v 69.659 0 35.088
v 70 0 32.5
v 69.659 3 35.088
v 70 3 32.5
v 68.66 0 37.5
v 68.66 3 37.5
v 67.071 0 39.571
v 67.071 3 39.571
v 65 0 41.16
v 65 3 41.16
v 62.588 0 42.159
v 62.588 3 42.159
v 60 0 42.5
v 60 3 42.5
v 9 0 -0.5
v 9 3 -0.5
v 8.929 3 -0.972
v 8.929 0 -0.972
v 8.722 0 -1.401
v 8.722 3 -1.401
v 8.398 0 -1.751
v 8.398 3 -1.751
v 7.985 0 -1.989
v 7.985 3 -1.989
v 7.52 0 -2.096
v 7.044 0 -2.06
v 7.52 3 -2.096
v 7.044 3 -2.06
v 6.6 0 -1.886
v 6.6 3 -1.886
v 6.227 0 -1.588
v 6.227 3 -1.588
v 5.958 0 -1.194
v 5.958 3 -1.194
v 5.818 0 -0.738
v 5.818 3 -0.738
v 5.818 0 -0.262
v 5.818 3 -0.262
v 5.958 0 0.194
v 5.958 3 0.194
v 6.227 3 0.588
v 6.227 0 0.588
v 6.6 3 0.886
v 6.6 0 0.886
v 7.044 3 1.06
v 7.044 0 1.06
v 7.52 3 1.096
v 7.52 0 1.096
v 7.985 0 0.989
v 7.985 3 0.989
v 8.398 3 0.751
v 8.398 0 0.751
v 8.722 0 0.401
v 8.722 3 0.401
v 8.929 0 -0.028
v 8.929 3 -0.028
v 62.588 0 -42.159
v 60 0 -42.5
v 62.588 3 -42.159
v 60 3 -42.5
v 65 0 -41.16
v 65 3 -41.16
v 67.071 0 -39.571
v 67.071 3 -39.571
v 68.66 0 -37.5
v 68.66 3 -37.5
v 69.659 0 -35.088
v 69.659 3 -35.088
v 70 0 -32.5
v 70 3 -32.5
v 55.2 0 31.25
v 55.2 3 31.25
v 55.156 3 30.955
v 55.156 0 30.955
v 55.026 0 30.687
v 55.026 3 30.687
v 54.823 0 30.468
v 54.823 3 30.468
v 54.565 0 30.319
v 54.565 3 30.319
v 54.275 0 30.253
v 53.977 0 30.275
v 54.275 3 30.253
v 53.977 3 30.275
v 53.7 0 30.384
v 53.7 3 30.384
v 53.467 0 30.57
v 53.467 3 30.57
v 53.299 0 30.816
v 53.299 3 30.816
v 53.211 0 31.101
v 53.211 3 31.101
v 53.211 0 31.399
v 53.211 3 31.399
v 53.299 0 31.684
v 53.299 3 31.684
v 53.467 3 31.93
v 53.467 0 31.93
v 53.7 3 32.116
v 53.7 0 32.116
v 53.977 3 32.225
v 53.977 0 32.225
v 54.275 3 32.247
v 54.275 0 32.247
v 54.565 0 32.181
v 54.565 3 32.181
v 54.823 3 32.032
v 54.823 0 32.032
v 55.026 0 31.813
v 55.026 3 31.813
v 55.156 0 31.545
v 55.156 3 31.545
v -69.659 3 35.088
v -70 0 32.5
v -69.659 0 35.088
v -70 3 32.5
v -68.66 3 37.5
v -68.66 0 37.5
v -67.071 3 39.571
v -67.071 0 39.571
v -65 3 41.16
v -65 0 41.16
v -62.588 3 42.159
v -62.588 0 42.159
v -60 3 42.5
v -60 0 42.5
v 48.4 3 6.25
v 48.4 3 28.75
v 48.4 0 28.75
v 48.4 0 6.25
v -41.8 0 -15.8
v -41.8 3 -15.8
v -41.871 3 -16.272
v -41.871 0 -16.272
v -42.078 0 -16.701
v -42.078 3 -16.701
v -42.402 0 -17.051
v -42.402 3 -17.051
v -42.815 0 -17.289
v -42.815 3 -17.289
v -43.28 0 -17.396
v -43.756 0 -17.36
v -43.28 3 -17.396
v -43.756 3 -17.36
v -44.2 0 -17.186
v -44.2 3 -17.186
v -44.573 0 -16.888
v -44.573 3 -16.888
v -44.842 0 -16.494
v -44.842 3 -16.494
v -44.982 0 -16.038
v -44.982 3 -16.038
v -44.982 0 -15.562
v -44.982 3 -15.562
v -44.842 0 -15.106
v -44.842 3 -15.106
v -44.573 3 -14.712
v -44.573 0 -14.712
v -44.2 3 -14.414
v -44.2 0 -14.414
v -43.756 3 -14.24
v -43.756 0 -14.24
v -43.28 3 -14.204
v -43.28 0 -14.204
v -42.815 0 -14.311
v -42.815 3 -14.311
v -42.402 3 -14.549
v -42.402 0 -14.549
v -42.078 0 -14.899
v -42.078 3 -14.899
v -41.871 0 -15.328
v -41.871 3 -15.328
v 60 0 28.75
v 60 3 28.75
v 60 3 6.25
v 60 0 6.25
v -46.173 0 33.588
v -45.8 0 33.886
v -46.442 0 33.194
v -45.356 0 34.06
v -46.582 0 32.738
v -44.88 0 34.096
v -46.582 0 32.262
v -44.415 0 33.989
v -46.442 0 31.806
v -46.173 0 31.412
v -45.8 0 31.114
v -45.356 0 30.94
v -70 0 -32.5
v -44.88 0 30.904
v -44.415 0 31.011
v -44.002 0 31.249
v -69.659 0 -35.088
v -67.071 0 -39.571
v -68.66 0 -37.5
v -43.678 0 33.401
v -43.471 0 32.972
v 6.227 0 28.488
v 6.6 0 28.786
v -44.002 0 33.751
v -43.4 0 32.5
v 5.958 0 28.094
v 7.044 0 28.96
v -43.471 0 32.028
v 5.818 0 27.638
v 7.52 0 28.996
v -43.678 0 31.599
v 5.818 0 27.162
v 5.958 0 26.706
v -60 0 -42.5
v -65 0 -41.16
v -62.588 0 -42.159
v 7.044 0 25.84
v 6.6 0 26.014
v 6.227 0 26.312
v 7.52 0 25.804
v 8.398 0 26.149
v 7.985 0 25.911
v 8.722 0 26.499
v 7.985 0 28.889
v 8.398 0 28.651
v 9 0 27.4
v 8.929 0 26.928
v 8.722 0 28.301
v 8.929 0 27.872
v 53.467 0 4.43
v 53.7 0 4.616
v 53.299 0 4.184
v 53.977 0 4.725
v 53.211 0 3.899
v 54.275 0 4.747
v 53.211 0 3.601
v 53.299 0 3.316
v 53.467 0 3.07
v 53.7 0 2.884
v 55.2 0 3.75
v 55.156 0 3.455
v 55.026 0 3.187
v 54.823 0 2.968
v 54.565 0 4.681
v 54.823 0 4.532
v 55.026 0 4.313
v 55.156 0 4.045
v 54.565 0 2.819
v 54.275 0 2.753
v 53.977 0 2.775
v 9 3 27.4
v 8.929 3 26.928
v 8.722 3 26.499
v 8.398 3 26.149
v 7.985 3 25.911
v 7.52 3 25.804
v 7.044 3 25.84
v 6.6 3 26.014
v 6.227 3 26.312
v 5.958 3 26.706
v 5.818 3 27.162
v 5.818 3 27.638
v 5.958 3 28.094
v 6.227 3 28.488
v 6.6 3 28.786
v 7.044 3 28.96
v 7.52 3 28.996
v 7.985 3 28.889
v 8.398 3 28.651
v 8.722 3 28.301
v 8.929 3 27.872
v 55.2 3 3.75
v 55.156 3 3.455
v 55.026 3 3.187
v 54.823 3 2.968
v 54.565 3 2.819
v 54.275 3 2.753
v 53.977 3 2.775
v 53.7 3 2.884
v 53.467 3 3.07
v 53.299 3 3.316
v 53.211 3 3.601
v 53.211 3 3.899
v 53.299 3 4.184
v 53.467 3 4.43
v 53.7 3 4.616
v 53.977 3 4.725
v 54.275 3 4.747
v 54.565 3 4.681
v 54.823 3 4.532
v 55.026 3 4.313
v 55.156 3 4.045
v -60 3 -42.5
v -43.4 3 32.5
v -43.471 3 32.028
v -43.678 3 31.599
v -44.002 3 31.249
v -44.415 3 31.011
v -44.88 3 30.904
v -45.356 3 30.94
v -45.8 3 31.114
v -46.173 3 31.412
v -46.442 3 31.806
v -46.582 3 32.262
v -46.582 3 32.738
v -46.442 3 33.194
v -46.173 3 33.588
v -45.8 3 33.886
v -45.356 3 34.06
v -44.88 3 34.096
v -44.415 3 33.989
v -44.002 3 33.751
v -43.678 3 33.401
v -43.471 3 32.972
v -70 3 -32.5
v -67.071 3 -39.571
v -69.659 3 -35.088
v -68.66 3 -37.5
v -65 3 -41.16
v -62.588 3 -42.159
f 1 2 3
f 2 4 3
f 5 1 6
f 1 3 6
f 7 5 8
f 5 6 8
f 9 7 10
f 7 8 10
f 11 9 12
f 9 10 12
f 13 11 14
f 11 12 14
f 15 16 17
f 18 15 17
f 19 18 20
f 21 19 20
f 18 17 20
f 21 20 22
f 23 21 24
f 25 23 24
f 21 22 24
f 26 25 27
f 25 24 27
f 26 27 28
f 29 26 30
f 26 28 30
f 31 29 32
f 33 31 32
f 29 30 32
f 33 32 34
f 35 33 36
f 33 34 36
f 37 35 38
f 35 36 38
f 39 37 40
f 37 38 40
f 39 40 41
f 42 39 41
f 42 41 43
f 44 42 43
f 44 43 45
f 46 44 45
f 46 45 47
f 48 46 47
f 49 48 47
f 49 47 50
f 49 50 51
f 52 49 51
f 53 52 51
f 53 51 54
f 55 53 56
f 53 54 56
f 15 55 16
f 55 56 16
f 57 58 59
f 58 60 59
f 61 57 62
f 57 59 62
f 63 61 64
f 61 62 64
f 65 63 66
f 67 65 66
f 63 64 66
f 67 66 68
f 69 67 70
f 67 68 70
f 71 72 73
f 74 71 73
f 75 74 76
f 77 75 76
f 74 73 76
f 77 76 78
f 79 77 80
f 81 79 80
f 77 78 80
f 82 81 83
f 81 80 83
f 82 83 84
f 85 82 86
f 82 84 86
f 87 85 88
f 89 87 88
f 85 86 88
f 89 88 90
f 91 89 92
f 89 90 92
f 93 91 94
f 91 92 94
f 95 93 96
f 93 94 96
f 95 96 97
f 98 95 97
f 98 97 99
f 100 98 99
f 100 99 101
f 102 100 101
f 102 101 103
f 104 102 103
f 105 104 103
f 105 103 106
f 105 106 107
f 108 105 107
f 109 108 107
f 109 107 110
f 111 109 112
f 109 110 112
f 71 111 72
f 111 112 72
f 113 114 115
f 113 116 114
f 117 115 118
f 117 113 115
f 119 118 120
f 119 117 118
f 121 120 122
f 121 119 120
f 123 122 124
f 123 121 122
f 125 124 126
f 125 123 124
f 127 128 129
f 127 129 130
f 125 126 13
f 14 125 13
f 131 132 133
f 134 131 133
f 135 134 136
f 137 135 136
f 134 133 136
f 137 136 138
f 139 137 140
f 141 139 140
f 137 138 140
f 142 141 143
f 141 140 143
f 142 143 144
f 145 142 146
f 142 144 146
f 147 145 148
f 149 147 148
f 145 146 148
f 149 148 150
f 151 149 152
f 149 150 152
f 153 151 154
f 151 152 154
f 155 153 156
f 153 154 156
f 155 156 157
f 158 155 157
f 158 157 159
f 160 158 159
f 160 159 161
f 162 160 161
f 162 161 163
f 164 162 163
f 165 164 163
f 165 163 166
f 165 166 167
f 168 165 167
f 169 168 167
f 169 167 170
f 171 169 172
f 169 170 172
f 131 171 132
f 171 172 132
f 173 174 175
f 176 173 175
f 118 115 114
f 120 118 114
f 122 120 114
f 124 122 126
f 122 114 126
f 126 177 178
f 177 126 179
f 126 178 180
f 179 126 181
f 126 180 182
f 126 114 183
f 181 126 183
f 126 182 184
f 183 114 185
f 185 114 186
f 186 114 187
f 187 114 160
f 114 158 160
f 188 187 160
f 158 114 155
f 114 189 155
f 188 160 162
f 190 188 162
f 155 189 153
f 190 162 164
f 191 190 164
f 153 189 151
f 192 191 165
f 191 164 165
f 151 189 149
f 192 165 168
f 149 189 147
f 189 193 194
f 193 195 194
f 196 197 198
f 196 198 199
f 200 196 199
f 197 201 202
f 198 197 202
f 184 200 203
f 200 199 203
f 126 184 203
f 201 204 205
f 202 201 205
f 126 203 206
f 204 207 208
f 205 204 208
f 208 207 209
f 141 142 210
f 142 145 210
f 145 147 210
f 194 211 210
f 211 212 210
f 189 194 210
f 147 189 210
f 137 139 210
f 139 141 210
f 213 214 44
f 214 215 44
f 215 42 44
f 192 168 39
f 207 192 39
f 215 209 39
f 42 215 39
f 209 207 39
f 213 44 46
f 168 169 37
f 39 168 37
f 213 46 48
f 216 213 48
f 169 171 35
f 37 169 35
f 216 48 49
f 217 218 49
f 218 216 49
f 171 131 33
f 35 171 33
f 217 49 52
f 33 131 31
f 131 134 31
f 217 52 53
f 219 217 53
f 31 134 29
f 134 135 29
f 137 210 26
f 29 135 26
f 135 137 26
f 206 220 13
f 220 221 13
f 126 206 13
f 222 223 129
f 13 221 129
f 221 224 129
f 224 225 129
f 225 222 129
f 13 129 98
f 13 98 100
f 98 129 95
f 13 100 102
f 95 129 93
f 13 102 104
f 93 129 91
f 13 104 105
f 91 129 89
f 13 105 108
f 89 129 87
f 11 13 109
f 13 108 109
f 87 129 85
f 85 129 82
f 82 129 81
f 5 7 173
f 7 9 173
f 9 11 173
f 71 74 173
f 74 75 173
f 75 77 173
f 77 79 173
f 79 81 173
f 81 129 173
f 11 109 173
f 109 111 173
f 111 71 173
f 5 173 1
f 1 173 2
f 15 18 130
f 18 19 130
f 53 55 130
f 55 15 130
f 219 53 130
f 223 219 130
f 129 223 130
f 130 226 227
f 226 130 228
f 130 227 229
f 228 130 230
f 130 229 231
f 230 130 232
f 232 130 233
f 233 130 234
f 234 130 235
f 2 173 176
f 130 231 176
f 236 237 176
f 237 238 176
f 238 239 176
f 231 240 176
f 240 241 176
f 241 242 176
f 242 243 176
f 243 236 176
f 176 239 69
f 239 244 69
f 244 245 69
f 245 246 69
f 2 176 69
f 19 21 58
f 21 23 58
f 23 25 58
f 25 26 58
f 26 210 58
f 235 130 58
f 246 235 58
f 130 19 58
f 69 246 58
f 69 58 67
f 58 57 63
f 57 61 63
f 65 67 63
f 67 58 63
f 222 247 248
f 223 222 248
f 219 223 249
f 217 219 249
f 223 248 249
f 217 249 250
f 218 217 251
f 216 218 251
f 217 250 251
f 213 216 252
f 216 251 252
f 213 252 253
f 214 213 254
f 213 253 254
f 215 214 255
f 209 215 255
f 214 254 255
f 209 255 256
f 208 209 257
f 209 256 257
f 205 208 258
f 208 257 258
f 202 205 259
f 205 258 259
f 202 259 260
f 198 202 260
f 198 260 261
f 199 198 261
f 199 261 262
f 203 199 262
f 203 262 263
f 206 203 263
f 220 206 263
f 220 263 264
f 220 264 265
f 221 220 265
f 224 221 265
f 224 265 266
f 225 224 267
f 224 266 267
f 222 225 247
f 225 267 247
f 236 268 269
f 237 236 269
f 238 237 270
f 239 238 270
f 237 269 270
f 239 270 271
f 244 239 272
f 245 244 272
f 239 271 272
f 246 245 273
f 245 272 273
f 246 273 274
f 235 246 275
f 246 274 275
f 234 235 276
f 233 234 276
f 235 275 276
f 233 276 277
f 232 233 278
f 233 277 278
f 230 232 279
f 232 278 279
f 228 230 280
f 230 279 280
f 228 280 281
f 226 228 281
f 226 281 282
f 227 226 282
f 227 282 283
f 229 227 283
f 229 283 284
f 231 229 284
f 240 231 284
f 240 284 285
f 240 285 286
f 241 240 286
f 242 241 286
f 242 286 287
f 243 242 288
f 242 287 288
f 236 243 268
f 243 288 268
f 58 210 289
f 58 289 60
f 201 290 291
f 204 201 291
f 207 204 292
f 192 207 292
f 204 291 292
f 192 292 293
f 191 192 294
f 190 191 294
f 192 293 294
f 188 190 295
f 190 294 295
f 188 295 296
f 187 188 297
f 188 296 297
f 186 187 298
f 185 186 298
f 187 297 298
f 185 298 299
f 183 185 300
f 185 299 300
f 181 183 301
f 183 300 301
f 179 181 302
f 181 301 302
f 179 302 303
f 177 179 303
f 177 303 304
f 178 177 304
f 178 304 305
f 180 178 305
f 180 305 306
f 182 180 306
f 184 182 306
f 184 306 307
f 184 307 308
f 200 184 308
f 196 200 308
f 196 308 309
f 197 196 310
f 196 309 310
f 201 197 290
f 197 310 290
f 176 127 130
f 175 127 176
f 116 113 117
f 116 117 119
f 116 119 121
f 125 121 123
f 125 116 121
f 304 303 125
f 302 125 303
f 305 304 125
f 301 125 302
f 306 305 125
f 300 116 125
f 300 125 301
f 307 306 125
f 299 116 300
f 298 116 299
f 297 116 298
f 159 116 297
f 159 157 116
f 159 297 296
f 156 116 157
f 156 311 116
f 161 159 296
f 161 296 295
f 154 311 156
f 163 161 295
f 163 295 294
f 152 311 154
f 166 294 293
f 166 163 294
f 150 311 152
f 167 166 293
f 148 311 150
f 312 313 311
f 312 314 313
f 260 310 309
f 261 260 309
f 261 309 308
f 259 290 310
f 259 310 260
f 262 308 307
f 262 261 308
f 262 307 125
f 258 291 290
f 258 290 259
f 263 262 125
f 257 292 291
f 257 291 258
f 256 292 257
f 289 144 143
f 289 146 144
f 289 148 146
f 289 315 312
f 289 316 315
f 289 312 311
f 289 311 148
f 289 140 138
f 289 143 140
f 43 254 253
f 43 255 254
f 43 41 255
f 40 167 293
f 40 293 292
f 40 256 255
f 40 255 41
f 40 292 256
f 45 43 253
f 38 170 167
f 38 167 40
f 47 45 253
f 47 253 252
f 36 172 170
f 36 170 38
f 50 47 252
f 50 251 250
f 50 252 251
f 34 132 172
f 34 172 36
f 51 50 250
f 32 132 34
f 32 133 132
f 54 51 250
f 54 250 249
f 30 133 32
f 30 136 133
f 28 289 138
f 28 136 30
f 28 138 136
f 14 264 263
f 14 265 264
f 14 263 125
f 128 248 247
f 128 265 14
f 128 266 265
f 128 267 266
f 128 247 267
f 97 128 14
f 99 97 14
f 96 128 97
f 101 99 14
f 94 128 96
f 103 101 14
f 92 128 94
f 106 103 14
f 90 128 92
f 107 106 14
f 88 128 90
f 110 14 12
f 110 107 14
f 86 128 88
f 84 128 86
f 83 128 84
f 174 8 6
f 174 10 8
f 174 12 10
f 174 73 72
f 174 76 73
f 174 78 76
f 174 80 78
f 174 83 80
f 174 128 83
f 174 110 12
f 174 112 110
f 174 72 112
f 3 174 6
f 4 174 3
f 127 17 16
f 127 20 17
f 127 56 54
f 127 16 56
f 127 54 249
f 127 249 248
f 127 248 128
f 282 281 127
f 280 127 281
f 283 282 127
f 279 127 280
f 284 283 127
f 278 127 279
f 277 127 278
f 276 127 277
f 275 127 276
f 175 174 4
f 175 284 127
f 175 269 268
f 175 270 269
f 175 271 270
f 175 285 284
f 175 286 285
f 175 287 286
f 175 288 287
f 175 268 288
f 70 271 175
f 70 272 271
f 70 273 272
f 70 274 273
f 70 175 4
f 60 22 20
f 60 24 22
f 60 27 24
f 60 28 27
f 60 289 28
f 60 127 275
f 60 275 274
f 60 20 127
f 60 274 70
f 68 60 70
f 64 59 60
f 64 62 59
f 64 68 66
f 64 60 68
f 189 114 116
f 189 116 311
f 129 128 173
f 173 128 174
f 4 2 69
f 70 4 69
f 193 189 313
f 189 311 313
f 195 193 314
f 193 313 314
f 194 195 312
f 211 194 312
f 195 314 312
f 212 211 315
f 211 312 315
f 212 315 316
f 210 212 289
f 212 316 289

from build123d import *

# Parameters (mm, degrees)
SKETCH3_W           = 140
SKETCH3_H           = 85
BOSS_EXTRUDE1_DEPTH = 3
SKETCH4_R           = 1.6
CUT_EXTRUDE1_DEPTH  = 3
FILLET1_R           = 10
FILLET2_R           = 10
FILLET3_R           = 10
FILLET4_R           = 10
SKETCH7_R           = 1
SKETCH7_W           = 11.6
SKETCH7_H           = 22.5
CUT_EXTRUDE4_DEPTH  = 3


with BuildPart() as part:
    # Sketch3 → Boss-Extrude1 (new body)
    with BuildSketch(Plane(origin=(0, 0, 0), x_dir=(1, 0, 0), z_dir=(0, 1, 0))):
        Rectangle(SKETCH3_W, SKETCH3_H)
    extrude(amount=BOSS_EXTRUDE1_DEPTH)

    # Sketch4 → Cut-Extrude1 (cut)
    with BuildSketch(Plane(origin=(0, 3, 0), x_dir=(1, 0, 0), z_dir=(0, 1, 0))):
        with Locations((-43.4, 15.8)):
            Circle(SKETCH4_R)
        with Locations((7.4, 0.5)):
            Circle(SKETCH4_R)
        with Locations((-45, -32.5)):
            Circle(SKETCH4_R)
        with Locations((7.4, -27.4)):
            Circle(SKETCH4_R)
    extrude(amount=-CUT_EXTRUDE1_DEPTH, mode=Mode.SUBTRACT)

    # Fillet1
    fillet1_edges = [part.edges().sort_by_distance(p)[0] for p in [
        (-70, 1.5, 42.5),
    ]]
    fillet(fillet1_edges, radius=FILLET1_R)

    # Fillet2
    fillet2_edges = [part.edges().sort_by_distance(p)[0] for p in [
        (-70, 1.5, -42.5),
    ]]
    fillet(fillet2_edges, radius=FILLET2_R)

    # Fillet3
    fillet3_edges = [part.edges().sort_by_distance(p)[0] for p in [
        (70, 1.5, -42.5),
    ]]
    fillet(fillet3_edges, radius=FILLET3_R)

    # Fillet4
    fillet4_edges = [part.edges().sort_by_distance(p)[0] for p in [
        (70, 1.5, 42.5),
    ]]
    fillet(fillet4_edges, radius=FILLET4_R)

    # Sketch7 → Cut-Extrude4 (cut)
    with BuildSketch(Plane(origin=(0, 3, 0), x_dir=(1, 0, 0), z_dir=(0, 1, 0))):
        with Locations((54.2, -31.25)):
            Circle(SKETCH7_R)
        with Locations((54.2, -3.75)):
            Circle(SKETCH7_R)
        with Locations((54.2, -17.5)):
            Rectangle(SKETCH7_W, SKETCH7_H)
    extrude(amount=-CUT_EXTRUDE4_DEPTH, mode=Mode.SUBTRACT)


solid = part.part
